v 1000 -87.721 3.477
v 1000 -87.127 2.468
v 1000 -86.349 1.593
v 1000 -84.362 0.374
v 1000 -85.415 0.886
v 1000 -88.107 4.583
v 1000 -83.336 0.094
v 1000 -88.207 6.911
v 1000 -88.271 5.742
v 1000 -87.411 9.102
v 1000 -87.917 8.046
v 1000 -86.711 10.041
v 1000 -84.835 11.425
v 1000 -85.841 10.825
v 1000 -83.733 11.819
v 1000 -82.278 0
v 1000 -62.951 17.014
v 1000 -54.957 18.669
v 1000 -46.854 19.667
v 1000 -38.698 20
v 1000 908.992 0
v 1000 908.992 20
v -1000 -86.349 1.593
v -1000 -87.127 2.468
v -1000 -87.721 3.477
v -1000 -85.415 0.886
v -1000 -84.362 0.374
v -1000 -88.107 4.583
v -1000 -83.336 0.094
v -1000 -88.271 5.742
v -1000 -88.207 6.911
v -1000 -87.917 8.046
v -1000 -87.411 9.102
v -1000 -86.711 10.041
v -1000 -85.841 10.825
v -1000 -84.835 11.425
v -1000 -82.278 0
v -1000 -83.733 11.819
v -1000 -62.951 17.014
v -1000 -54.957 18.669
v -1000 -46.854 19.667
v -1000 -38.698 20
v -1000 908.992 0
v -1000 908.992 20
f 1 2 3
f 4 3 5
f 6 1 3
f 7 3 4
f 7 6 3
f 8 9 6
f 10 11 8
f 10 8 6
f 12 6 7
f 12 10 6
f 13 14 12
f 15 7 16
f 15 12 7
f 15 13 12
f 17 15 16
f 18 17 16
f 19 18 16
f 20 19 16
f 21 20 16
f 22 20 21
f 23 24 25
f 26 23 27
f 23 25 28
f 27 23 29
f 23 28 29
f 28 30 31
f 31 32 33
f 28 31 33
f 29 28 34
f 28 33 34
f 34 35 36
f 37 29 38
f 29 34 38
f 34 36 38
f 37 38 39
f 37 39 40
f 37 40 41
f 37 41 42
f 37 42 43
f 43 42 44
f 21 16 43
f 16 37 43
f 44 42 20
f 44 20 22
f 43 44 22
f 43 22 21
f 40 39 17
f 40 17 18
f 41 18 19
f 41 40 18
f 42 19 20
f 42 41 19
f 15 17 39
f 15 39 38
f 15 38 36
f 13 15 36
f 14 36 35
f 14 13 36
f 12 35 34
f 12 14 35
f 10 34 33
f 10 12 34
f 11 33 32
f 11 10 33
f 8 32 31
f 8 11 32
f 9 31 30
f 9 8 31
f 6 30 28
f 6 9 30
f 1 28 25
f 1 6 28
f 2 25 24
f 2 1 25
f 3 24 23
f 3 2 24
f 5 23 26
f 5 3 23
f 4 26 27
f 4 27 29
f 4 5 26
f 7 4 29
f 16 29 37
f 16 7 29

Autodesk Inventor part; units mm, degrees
ref_plane "YZ Plane" through (0, 0, 0) normal (1, 0, 0) x (0, 1, 0)
ref_plane "XZ Plane" through (0, 0, 0) normal (0, 1, 0) x (-1, 0, 0)
ref_plane "XY Plane" through (0, 0, 0) normal (0, 0, 1) x (1, 0, 0)
sketch "Skizze1" plane through (0, 0, 0) normal (1, 0, 0) x (0, 1, 0)
  line L0 (-291.0081, 0) -> (1108.9919, 0) projected
  line L1 (0, -4) -> (0, 24) projected
  line L2 (-91.0081, 20) -> (908.9919, 20)
  line L3 (908.9919, 20) -> (908.9919, 0)
  line L4 (908.9919, 0) -> (-91.0081, 0)
  line L5 (-91.0081, 0) -> (-91.0081, 20)
  line L6 (-51.0081, 20) -> (-91.0081, 10)
  dimension "d0" = 20
  dimension "d1" = 1000
  dimension "d2" = 40
  dimension "d3" = 10
extrude "Extrusion1" add sketch "Skizze1" along normal mid plane 2000 contours L5 L6 L2 L1 L0 | L1 L2 L3 L0
fillet "Rundung1" radius 100 1 edges at (0, -51.0081, 20)
fillet "Rundung2" radius 6 2 edges at (0, -91.0081, 10) (0, -91.0081, 0)
properties part number "Arbeitsplatte"
